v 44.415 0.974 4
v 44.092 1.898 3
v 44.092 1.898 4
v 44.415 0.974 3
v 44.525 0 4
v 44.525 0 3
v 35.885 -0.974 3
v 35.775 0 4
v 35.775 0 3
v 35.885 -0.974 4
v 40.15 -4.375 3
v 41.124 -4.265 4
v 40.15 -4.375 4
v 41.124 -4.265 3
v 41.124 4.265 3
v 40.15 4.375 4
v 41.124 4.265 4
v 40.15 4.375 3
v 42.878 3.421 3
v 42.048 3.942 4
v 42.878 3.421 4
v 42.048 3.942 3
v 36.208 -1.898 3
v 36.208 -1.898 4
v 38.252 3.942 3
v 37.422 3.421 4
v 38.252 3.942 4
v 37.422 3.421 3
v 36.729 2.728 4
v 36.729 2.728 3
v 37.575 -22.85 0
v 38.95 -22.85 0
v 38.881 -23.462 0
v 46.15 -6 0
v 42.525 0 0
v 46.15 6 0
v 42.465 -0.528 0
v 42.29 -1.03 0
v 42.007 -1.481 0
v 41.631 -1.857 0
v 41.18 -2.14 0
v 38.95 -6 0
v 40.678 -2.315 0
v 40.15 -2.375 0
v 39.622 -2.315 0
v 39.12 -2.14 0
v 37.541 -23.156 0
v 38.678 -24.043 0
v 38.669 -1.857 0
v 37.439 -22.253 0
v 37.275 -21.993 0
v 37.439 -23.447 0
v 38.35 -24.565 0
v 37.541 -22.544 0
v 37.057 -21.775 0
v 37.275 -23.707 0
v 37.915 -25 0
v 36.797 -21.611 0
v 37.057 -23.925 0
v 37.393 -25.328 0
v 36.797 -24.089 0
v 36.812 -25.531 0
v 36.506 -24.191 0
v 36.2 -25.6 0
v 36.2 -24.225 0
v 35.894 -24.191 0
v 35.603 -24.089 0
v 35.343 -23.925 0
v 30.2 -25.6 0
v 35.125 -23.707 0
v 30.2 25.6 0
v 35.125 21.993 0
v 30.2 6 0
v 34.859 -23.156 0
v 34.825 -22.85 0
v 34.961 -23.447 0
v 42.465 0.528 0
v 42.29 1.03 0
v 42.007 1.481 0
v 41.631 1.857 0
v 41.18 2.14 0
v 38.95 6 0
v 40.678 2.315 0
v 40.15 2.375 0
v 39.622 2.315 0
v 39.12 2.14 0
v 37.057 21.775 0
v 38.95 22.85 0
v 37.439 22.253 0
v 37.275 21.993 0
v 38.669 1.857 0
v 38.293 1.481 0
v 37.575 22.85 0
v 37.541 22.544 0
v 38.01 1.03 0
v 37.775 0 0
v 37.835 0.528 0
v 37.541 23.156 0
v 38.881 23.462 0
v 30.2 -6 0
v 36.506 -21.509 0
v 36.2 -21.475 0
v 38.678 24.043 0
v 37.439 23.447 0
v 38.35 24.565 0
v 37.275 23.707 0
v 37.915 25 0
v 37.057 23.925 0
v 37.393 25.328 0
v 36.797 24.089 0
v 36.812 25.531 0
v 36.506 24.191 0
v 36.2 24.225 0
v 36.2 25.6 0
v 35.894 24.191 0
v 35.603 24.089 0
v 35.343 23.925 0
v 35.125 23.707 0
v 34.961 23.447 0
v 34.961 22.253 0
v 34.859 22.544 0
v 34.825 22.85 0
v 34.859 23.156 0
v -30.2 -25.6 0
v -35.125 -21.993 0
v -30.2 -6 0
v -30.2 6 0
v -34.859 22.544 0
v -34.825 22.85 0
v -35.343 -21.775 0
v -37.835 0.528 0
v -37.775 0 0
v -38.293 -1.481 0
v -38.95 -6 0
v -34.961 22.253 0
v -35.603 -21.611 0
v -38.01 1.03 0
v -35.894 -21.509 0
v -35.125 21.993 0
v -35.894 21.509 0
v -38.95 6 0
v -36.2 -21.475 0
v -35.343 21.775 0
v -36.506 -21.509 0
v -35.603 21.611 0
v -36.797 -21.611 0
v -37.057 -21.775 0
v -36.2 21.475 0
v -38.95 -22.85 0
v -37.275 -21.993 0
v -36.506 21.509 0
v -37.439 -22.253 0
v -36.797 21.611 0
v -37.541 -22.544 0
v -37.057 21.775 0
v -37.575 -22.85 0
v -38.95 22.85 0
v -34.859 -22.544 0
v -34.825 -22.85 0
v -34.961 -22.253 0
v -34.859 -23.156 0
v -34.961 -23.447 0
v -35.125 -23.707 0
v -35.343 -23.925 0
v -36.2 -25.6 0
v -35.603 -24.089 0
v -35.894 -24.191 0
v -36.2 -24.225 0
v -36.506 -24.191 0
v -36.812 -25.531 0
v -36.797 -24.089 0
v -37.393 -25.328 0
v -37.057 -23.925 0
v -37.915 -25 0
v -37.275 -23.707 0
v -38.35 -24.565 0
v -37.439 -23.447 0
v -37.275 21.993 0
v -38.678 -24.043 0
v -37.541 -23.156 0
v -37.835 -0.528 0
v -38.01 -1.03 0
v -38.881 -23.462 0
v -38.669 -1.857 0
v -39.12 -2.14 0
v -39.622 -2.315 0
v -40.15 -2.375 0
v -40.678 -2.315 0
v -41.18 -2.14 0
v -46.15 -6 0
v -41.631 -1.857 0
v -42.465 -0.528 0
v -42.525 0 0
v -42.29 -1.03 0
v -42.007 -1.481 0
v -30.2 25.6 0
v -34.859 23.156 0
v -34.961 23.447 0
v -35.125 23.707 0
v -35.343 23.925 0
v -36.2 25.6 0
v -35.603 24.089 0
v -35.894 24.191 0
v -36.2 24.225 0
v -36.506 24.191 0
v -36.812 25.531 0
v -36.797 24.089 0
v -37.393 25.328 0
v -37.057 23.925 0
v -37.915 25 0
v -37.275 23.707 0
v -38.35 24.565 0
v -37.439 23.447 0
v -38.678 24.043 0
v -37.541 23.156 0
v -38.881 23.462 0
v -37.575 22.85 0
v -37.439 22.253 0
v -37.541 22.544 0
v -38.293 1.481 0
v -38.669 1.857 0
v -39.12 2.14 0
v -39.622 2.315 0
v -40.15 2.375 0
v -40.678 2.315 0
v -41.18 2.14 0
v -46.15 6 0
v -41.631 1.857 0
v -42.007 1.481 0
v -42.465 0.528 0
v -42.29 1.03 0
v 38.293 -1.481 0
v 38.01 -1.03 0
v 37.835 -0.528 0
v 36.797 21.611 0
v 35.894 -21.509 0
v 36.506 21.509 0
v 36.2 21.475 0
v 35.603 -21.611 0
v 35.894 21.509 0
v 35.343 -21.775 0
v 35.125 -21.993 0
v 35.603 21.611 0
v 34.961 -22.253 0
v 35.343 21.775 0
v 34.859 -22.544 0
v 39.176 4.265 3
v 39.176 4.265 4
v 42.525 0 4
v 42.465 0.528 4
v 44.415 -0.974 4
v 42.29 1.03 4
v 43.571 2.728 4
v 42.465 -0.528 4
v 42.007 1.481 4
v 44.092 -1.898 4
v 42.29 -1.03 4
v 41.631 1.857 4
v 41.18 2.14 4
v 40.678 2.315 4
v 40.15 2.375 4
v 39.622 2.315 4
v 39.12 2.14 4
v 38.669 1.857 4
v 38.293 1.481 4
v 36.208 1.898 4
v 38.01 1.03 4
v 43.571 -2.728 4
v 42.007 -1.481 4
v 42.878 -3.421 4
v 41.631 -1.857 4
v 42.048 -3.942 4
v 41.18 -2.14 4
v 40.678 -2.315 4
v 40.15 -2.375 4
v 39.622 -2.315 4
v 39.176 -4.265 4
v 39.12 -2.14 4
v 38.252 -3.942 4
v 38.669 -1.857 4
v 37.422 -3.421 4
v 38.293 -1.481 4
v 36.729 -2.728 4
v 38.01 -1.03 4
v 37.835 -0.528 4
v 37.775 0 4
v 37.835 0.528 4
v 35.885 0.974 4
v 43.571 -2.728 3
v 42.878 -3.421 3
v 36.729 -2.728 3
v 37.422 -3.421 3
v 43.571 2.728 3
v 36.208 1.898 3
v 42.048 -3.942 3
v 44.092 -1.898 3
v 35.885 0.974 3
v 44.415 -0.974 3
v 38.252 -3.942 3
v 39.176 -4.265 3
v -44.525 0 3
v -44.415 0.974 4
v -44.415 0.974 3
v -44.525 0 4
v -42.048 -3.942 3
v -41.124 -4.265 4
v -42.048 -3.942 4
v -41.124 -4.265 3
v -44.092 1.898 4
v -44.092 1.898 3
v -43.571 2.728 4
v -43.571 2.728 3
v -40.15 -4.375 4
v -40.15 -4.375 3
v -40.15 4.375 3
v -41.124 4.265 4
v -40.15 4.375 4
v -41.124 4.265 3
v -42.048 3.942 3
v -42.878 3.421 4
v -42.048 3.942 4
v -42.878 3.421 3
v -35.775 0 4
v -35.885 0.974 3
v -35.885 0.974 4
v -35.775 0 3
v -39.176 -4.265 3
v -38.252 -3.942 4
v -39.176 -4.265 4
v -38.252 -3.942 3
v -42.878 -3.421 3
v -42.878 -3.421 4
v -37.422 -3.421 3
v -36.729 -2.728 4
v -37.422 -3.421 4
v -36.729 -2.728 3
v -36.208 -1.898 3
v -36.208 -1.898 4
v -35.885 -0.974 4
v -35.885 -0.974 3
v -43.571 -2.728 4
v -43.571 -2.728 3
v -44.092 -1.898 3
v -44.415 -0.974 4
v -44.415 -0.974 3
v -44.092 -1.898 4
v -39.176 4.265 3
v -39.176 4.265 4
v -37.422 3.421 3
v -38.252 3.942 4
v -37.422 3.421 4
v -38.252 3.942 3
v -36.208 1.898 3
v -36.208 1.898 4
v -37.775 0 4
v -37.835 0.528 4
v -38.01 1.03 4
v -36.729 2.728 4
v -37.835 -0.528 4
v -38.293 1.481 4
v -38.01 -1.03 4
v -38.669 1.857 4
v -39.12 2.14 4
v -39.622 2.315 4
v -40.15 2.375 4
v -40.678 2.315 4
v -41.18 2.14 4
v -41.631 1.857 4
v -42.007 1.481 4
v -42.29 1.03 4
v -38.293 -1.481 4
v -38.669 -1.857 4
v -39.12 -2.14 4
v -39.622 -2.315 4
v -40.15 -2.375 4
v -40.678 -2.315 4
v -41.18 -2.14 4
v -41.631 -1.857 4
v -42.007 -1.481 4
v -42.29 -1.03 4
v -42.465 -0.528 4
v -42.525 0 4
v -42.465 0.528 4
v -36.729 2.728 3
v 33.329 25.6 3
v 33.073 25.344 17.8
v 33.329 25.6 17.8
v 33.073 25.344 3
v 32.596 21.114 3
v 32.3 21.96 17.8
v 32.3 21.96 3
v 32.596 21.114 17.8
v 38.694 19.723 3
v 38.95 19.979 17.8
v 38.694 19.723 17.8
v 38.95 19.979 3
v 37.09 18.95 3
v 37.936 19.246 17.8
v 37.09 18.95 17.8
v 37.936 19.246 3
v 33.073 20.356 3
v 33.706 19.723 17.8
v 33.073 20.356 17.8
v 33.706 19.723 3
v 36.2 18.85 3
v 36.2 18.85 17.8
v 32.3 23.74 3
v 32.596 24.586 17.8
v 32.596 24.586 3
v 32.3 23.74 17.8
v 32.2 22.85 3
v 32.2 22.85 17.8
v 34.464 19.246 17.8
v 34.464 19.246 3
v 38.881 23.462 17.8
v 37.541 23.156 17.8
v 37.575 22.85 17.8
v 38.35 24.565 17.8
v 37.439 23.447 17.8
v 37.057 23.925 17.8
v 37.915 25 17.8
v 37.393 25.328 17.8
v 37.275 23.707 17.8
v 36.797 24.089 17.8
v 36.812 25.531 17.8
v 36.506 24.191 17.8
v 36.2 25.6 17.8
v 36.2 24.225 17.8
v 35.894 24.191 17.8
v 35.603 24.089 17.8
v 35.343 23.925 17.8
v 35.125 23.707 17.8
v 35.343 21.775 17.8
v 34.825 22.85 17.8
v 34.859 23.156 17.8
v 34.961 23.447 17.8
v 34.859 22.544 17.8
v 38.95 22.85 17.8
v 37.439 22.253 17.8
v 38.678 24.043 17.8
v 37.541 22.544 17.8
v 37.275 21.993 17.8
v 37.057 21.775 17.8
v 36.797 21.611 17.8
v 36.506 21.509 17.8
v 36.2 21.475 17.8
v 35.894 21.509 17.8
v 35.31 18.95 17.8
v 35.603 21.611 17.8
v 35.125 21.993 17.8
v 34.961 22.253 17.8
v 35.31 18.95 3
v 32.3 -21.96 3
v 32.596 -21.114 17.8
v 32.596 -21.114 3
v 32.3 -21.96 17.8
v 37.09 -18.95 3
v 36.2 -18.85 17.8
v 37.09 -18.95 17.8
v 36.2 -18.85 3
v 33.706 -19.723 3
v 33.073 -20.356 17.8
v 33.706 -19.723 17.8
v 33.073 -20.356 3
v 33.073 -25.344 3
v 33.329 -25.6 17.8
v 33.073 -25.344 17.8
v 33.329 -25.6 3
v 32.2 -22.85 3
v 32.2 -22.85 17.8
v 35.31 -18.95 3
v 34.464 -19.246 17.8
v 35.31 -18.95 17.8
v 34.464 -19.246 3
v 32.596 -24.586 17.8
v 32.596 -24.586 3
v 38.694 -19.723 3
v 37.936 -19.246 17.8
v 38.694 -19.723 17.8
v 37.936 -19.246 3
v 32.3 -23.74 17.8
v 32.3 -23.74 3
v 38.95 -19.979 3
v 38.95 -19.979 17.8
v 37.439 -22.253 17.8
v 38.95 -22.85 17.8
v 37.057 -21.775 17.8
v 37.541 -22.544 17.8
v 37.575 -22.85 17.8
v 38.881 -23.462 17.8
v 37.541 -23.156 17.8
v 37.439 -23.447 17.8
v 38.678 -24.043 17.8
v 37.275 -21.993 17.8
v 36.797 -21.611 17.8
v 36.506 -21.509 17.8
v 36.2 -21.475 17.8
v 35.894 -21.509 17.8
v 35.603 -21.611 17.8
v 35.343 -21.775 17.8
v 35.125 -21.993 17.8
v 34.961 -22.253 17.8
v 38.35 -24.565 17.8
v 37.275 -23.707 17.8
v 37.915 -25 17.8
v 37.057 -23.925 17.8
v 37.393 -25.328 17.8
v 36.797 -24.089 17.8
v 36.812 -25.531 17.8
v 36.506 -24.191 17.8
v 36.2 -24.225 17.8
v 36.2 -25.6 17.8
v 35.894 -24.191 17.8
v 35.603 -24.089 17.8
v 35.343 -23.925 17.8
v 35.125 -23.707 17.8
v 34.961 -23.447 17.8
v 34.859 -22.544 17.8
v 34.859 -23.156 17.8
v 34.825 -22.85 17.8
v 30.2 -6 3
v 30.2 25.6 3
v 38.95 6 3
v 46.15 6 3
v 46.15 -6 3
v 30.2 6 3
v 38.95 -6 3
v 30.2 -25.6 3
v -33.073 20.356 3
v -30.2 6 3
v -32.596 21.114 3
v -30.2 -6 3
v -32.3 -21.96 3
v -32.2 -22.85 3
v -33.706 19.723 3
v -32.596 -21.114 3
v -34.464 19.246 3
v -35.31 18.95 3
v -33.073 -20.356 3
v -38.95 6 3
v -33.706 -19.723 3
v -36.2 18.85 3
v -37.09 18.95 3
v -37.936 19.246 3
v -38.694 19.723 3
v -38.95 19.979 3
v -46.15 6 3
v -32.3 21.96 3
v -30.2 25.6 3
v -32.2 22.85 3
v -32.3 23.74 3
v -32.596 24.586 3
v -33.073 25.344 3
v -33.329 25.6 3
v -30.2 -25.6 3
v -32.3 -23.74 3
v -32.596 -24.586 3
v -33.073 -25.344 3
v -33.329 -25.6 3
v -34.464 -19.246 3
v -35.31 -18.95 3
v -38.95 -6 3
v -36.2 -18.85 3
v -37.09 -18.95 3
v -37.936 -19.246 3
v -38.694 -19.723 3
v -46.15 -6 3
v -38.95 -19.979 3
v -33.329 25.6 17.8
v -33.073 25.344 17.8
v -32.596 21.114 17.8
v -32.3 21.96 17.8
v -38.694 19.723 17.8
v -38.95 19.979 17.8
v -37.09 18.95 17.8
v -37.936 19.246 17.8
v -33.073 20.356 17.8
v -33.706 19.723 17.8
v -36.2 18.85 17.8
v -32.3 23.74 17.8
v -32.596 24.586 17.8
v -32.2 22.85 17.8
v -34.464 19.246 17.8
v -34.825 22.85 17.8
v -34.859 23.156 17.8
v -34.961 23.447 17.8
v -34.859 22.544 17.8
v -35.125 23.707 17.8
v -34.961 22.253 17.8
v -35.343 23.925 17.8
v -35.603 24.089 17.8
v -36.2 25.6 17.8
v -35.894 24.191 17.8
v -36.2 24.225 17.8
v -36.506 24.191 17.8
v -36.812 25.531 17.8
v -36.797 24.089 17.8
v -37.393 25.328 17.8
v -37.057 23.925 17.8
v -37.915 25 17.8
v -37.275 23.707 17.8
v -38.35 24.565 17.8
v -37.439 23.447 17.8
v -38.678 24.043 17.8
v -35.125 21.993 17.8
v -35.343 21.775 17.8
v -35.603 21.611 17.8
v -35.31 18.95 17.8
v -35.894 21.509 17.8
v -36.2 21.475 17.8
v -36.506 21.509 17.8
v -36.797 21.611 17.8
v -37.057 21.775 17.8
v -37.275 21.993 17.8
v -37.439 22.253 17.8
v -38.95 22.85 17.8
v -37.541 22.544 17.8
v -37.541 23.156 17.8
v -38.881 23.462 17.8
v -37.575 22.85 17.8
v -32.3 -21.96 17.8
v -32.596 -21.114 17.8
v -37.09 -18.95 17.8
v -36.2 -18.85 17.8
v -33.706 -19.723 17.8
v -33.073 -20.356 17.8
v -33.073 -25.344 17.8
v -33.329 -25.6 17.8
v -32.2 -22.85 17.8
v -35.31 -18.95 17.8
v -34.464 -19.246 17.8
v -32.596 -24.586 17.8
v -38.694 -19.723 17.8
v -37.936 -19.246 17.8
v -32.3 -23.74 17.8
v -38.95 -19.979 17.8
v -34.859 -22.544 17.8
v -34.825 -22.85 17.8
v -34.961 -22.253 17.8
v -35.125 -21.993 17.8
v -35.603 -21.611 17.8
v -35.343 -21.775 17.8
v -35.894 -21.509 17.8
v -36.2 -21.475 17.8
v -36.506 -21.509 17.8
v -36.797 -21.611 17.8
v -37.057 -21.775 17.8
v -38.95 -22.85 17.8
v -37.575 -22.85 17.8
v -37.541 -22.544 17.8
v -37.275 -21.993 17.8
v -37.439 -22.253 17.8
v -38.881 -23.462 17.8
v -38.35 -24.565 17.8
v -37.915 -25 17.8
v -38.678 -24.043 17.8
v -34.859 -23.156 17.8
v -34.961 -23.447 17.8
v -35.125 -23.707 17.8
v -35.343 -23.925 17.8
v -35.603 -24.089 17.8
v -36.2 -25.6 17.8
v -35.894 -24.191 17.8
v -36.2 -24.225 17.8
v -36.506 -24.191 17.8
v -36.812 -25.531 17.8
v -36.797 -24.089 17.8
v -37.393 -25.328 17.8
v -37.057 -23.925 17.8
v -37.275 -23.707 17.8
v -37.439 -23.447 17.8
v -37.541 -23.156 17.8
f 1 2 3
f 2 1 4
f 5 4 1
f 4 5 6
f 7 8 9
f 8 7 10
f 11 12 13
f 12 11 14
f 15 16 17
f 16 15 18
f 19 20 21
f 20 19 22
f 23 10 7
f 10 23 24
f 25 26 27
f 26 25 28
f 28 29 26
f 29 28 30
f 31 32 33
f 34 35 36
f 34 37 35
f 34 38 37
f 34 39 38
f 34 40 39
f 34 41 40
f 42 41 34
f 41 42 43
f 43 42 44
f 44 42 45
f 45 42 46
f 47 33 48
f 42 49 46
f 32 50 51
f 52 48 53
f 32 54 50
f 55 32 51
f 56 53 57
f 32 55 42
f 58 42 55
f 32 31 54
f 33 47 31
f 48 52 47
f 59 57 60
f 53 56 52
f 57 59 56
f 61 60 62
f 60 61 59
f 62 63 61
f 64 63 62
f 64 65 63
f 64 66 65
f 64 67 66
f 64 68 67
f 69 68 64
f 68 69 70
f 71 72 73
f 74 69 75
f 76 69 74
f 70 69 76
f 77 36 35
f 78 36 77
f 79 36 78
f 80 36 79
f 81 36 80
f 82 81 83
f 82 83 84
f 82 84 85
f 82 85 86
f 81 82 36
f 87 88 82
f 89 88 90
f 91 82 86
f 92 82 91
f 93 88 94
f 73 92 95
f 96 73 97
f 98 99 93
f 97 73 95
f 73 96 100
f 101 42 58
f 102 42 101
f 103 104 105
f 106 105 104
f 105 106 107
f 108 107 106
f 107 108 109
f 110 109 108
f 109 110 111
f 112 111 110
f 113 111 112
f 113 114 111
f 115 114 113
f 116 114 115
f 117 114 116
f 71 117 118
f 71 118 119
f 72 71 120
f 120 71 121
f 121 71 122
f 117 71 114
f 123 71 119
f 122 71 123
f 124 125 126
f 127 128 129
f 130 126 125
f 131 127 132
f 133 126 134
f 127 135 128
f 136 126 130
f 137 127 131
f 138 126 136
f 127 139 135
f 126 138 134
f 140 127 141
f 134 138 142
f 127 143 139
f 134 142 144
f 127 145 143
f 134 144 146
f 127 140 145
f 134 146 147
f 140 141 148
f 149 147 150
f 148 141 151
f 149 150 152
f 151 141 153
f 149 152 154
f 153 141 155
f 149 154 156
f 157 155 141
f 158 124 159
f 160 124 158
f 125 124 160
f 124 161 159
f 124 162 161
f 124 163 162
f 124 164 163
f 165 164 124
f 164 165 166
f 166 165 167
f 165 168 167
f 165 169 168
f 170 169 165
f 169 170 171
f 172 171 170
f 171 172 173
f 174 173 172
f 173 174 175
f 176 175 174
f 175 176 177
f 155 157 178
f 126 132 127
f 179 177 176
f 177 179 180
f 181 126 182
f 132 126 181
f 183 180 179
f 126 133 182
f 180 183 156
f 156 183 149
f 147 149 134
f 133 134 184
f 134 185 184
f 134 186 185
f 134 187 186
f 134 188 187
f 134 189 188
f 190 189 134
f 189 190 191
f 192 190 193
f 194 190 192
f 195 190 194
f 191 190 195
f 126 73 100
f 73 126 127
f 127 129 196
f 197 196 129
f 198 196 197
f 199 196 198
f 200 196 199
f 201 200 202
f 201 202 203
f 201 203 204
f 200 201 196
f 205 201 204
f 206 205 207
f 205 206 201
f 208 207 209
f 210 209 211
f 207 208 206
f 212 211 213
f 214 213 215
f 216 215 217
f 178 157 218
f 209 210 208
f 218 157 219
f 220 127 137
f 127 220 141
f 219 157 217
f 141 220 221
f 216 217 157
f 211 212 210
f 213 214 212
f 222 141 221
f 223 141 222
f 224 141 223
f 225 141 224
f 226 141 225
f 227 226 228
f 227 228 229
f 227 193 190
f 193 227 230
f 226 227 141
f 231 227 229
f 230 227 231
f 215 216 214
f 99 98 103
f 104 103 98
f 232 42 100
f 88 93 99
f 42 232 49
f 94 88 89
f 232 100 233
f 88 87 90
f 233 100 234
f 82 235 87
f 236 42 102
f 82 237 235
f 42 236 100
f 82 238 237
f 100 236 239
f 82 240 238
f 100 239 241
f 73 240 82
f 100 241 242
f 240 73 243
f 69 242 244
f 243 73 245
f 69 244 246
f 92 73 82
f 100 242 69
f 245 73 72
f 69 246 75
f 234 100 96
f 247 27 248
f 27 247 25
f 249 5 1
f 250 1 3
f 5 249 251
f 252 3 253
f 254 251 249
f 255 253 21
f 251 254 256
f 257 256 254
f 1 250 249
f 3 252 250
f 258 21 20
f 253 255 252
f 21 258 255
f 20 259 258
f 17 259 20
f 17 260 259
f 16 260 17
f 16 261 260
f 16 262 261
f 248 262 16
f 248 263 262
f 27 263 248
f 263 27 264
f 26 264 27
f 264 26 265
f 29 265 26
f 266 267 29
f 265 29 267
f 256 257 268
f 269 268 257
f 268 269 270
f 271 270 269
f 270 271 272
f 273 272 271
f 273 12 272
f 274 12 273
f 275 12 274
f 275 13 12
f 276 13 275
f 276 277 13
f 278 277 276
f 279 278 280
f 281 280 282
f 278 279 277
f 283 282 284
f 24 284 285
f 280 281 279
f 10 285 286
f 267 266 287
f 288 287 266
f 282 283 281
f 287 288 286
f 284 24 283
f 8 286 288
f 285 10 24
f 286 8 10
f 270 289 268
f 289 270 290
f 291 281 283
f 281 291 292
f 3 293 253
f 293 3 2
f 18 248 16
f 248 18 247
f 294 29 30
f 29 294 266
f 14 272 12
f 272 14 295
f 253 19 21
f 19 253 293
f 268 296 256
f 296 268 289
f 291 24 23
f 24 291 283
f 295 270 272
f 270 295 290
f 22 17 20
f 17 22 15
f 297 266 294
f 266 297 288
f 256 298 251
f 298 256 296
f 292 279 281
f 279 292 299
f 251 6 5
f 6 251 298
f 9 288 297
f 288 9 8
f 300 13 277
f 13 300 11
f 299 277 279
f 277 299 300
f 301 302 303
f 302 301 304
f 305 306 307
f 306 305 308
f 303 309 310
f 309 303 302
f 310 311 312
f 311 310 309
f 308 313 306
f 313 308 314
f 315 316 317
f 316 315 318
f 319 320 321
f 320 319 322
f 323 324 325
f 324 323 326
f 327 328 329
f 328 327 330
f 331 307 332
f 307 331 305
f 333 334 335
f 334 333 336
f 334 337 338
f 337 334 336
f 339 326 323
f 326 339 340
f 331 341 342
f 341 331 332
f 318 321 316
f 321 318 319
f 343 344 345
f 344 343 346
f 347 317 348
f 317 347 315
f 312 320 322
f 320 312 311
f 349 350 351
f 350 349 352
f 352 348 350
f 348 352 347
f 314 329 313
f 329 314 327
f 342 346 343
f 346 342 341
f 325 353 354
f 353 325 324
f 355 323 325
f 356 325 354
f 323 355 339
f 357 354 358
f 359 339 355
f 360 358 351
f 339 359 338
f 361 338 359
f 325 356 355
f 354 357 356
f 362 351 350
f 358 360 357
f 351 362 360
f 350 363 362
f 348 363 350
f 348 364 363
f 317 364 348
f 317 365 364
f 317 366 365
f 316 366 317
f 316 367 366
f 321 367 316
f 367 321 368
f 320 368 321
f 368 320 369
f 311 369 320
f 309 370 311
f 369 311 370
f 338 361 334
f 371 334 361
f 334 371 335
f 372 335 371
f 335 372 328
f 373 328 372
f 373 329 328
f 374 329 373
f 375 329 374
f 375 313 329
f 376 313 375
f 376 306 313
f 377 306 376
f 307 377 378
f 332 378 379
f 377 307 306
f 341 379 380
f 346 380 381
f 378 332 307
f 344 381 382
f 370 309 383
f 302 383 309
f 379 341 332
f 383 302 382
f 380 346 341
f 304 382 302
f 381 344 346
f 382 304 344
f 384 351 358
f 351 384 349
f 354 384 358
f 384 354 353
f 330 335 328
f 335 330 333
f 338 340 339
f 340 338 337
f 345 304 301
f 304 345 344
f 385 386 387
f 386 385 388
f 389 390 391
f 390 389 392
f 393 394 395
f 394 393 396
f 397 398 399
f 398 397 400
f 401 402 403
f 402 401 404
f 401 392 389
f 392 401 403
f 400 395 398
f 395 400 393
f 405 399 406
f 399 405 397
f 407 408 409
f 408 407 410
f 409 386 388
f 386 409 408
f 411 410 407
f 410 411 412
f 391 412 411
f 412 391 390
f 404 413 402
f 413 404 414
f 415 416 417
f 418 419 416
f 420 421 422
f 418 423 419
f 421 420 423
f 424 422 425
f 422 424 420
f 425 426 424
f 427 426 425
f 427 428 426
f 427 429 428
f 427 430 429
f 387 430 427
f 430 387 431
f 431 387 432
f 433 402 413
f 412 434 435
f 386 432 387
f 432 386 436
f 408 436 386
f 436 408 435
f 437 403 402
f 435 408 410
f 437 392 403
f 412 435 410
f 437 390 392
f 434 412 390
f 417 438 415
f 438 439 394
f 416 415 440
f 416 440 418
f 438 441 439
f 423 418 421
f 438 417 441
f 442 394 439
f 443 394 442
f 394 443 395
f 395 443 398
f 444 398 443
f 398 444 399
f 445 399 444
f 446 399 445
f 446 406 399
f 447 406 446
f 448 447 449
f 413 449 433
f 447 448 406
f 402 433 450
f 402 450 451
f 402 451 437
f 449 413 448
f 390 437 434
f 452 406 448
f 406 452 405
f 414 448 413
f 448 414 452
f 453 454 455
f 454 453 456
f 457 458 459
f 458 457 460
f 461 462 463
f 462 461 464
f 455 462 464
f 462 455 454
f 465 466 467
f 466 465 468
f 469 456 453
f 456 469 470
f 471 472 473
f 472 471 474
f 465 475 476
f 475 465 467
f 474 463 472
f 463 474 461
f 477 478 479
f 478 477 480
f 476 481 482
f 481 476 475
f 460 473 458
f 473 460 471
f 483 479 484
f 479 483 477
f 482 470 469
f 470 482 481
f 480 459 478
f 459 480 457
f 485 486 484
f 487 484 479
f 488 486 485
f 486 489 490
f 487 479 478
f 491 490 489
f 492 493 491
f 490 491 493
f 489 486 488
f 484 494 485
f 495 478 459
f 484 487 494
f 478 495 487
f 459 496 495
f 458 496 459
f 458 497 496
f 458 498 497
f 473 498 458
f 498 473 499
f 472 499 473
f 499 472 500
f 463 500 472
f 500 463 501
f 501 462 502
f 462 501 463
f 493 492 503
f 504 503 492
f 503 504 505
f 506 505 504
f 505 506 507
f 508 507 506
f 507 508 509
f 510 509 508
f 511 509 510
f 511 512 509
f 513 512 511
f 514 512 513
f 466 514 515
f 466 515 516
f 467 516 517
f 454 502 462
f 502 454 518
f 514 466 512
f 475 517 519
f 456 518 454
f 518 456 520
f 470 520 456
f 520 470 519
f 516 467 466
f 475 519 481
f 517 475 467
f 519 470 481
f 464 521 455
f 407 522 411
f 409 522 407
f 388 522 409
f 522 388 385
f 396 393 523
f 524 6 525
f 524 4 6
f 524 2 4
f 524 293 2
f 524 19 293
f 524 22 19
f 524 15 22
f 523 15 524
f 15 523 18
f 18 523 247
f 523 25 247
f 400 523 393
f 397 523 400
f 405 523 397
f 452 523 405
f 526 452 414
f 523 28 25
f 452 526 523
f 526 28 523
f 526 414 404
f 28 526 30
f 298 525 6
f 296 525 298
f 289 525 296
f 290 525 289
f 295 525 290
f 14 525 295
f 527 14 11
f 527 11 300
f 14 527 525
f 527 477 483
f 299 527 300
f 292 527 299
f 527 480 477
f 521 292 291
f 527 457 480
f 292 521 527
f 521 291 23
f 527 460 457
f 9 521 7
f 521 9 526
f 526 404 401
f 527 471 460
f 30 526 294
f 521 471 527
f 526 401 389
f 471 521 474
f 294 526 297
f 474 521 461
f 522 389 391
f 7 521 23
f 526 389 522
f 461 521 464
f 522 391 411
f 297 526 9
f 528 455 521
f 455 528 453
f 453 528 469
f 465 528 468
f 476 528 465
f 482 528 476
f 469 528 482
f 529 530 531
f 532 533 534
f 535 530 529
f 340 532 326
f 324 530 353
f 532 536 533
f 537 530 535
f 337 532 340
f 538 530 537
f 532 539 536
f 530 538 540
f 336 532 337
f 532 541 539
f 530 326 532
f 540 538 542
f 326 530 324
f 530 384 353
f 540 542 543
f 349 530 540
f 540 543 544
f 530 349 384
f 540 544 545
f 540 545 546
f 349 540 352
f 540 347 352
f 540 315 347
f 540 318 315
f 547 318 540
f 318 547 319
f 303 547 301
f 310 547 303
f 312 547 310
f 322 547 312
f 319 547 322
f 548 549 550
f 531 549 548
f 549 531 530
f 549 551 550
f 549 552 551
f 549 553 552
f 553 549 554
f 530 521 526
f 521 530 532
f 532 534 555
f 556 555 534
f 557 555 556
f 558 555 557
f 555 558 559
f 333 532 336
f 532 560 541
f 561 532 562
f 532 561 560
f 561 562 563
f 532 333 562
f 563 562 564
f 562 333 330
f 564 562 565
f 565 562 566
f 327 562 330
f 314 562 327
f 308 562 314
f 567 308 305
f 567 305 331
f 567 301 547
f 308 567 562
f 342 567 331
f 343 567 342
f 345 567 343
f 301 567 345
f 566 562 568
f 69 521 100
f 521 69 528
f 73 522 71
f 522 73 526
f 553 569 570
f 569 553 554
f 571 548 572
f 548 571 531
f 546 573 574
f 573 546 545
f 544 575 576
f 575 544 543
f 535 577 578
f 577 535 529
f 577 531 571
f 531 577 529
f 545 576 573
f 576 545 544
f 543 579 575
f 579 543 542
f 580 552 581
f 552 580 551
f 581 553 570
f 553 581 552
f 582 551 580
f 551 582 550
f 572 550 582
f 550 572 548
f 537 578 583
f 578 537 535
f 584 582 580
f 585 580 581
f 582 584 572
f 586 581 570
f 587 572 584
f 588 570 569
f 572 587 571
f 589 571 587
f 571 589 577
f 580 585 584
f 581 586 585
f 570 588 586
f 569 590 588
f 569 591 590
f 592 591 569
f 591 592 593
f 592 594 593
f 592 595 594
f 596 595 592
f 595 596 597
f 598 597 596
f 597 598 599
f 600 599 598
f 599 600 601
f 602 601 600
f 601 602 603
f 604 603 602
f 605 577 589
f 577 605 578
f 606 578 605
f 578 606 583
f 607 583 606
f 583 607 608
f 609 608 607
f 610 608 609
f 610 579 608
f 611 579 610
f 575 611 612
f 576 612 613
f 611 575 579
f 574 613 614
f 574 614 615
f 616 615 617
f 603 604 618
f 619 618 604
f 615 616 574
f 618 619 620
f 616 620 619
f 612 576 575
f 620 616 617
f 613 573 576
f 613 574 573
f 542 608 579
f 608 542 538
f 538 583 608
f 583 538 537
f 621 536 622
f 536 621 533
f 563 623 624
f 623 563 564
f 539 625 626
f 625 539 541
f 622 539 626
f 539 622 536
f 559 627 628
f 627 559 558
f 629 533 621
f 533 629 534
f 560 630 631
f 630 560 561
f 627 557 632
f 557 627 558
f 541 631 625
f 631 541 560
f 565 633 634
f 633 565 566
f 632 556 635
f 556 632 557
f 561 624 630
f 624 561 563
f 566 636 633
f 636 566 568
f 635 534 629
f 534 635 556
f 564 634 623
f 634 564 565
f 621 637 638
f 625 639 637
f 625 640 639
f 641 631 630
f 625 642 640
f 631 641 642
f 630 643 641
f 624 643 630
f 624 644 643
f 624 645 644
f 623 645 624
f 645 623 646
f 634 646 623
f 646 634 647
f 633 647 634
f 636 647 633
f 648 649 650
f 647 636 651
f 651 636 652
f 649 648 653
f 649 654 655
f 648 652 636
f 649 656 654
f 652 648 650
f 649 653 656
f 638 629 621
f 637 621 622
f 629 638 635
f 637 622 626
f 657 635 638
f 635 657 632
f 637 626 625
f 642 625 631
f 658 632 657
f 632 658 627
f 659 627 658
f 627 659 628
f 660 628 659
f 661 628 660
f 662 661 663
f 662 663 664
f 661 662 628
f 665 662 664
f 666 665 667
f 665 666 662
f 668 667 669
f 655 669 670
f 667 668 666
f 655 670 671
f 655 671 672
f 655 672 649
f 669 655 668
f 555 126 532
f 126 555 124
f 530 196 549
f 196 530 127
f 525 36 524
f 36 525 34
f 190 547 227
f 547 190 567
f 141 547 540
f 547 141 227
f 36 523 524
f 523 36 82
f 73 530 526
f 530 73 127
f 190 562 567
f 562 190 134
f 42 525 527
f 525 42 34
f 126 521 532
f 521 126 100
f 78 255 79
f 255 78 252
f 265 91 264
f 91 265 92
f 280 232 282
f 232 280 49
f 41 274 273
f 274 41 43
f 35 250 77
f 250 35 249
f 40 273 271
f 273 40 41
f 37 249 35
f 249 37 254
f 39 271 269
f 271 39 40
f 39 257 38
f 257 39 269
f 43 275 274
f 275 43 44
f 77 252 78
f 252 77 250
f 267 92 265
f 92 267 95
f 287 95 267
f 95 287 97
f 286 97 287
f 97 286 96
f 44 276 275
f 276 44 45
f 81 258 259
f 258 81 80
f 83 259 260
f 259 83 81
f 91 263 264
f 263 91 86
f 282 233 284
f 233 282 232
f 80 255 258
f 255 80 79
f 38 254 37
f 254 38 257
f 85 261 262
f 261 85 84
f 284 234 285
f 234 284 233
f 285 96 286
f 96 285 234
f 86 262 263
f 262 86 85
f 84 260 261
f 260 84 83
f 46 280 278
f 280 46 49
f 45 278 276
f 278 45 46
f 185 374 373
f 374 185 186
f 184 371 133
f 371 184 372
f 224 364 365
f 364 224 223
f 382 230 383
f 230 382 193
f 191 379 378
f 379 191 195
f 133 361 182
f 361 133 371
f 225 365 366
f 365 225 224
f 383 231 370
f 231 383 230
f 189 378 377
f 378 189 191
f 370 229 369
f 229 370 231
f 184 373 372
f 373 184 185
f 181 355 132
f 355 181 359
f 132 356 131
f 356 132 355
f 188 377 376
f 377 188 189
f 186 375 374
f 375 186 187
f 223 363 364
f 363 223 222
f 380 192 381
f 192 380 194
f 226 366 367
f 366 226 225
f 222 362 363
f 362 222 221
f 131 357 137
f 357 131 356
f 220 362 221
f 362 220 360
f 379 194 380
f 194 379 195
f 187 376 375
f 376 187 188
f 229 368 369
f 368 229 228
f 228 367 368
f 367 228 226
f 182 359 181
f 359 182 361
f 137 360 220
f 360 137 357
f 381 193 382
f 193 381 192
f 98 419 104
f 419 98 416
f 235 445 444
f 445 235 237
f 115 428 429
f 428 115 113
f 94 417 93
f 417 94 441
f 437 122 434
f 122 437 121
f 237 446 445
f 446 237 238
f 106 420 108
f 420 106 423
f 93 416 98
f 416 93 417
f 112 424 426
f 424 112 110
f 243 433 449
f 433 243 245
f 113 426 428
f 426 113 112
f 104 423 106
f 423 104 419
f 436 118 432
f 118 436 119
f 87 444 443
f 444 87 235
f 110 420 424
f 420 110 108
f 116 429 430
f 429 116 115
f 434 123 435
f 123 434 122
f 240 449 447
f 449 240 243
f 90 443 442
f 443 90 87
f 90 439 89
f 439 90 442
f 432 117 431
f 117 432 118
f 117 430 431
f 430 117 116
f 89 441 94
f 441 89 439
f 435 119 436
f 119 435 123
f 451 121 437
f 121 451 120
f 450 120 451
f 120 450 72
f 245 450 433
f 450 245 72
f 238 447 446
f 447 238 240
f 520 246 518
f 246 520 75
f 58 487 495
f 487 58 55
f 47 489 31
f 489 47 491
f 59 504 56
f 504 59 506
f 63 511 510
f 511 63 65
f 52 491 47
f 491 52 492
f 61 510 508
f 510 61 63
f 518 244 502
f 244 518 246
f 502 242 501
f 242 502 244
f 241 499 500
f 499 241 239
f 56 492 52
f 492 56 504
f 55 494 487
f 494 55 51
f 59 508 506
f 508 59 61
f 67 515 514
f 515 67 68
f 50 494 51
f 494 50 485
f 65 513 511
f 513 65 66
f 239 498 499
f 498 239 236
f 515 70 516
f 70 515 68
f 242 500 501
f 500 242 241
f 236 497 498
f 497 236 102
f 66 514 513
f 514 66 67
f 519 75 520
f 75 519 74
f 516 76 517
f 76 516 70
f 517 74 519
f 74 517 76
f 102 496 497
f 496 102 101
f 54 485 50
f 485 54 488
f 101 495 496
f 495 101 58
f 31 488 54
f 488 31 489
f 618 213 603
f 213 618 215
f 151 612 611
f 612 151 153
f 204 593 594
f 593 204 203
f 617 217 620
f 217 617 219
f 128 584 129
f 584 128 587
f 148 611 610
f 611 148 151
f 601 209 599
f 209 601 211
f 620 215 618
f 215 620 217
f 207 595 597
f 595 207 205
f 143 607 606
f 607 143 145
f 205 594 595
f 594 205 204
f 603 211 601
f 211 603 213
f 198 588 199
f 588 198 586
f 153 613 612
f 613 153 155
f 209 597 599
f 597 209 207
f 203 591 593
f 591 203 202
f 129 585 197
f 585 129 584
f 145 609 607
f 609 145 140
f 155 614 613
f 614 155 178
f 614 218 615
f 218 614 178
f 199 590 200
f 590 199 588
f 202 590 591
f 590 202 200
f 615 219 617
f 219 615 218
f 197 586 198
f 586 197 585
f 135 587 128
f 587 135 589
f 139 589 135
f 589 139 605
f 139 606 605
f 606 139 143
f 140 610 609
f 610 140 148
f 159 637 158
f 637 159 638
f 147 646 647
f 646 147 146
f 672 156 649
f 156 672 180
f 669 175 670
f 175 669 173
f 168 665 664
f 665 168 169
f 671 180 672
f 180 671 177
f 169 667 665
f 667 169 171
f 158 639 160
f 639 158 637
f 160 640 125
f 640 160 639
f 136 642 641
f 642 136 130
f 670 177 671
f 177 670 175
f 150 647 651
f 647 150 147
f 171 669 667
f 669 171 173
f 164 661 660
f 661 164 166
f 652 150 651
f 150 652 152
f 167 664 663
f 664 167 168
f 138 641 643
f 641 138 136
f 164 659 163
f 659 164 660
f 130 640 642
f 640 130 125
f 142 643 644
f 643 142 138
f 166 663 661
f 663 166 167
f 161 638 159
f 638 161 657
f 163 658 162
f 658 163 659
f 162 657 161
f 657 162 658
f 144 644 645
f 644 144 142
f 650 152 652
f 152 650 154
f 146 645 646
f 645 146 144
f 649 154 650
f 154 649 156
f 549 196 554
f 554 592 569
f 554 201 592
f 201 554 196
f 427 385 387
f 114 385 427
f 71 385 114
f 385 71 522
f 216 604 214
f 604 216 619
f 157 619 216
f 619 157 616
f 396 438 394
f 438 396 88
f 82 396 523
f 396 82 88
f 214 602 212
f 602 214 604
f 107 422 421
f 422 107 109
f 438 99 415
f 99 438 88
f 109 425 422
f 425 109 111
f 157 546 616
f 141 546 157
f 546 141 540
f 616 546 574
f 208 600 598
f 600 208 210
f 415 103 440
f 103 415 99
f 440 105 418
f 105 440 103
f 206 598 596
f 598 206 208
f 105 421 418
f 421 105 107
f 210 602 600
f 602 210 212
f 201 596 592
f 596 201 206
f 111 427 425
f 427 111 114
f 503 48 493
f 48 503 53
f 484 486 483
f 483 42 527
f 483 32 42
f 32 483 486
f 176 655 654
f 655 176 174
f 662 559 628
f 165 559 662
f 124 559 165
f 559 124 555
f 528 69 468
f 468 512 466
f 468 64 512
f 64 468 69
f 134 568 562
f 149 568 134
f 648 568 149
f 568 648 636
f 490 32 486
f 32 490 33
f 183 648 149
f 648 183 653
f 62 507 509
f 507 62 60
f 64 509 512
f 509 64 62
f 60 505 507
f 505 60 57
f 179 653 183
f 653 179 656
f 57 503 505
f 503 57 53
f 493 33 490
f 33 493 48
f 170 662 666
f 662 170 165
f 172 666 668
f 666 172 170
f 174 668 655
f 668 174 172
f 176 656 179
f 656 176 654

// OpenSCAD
function inch() = 25.4;
function hole_clear() = 0.25;
function magtag_width_spacing() = 77.9 - 5.5;
function magtag_height_spacing() = 51.2 - 5.5;

$fn=28;

module cubexyz(dims, cx=false, cy=false, cz=false) {
    translate([cx?-dims.x/2:0, cy?-dims.y/2:0, cz?-dims.z/2:0])
        cube(dims);
}

module main(holes=true) {
    thickness = 3;
    total_height = 26.8-9;

    bottom_spacing = 80.3; // from the diagram
    bottom_width = 12;
    bottom_hole_diam = 4.5 + hole_clear(); // m4 clear

    //magtag_width_spacing = 77.9 - 5.5;
    //magtag_height_spacing = 51.2 - 5.5;
    magtag_hole_diam = 2.5 + hole_clear(); // m3 tap
    magtag_support_diam = 8;

    for (i=[1,-1]) scale([i,1,1]) translate([bottom_spacing/2,0,0]) {
        if (holes) {
            translate([0,0,-1])
            cylinder(d=bottom_hole_diam, h=thickness+4);
        } else {
            cylinder(d=bottom_hole_diam+4, h=thickness+1);
        }
    }
    if (!holes) {
        cubexyz([bottom_spacing+bottom_width, bottom_width, thickness],
                cx=true, cy=true);
    }
    for (i=[1,-1]) scale([i,1,1]) translate([magtag_width_spacing()/2,0,0]) {
            if (!holes) {
                cubexyz([bottom_width, magtag_height_spacing() + bottom_width, thickness], cx=true, cy=true);
            }
            for (j=[1,-1]) scale([1,j,1]) translate([0,magtag_height_spacing()/2,0]) {
                    if (holes) {
                        translate([0,0,-1]) cylinder(d=magtag_hole_diam, h=total_height+2);
                    } else {
                        cylinder(d=magtag_support_diam, h=total_height);
                    }
            }
    }
}

intersection() {
    difference() {
        main(holes=false);
        main(holes=true);
    }
    minkowski() {
        union() {
        cubexyz([magtag_width_spacing(), magtag_height_spacing(), 30],
                cx=true, cy=true);
        cubexyz([200,12-5.5,30],cx=true,cy=true);
        }
        cylinder(d=5.5, h=1, center=true);
    }
}
